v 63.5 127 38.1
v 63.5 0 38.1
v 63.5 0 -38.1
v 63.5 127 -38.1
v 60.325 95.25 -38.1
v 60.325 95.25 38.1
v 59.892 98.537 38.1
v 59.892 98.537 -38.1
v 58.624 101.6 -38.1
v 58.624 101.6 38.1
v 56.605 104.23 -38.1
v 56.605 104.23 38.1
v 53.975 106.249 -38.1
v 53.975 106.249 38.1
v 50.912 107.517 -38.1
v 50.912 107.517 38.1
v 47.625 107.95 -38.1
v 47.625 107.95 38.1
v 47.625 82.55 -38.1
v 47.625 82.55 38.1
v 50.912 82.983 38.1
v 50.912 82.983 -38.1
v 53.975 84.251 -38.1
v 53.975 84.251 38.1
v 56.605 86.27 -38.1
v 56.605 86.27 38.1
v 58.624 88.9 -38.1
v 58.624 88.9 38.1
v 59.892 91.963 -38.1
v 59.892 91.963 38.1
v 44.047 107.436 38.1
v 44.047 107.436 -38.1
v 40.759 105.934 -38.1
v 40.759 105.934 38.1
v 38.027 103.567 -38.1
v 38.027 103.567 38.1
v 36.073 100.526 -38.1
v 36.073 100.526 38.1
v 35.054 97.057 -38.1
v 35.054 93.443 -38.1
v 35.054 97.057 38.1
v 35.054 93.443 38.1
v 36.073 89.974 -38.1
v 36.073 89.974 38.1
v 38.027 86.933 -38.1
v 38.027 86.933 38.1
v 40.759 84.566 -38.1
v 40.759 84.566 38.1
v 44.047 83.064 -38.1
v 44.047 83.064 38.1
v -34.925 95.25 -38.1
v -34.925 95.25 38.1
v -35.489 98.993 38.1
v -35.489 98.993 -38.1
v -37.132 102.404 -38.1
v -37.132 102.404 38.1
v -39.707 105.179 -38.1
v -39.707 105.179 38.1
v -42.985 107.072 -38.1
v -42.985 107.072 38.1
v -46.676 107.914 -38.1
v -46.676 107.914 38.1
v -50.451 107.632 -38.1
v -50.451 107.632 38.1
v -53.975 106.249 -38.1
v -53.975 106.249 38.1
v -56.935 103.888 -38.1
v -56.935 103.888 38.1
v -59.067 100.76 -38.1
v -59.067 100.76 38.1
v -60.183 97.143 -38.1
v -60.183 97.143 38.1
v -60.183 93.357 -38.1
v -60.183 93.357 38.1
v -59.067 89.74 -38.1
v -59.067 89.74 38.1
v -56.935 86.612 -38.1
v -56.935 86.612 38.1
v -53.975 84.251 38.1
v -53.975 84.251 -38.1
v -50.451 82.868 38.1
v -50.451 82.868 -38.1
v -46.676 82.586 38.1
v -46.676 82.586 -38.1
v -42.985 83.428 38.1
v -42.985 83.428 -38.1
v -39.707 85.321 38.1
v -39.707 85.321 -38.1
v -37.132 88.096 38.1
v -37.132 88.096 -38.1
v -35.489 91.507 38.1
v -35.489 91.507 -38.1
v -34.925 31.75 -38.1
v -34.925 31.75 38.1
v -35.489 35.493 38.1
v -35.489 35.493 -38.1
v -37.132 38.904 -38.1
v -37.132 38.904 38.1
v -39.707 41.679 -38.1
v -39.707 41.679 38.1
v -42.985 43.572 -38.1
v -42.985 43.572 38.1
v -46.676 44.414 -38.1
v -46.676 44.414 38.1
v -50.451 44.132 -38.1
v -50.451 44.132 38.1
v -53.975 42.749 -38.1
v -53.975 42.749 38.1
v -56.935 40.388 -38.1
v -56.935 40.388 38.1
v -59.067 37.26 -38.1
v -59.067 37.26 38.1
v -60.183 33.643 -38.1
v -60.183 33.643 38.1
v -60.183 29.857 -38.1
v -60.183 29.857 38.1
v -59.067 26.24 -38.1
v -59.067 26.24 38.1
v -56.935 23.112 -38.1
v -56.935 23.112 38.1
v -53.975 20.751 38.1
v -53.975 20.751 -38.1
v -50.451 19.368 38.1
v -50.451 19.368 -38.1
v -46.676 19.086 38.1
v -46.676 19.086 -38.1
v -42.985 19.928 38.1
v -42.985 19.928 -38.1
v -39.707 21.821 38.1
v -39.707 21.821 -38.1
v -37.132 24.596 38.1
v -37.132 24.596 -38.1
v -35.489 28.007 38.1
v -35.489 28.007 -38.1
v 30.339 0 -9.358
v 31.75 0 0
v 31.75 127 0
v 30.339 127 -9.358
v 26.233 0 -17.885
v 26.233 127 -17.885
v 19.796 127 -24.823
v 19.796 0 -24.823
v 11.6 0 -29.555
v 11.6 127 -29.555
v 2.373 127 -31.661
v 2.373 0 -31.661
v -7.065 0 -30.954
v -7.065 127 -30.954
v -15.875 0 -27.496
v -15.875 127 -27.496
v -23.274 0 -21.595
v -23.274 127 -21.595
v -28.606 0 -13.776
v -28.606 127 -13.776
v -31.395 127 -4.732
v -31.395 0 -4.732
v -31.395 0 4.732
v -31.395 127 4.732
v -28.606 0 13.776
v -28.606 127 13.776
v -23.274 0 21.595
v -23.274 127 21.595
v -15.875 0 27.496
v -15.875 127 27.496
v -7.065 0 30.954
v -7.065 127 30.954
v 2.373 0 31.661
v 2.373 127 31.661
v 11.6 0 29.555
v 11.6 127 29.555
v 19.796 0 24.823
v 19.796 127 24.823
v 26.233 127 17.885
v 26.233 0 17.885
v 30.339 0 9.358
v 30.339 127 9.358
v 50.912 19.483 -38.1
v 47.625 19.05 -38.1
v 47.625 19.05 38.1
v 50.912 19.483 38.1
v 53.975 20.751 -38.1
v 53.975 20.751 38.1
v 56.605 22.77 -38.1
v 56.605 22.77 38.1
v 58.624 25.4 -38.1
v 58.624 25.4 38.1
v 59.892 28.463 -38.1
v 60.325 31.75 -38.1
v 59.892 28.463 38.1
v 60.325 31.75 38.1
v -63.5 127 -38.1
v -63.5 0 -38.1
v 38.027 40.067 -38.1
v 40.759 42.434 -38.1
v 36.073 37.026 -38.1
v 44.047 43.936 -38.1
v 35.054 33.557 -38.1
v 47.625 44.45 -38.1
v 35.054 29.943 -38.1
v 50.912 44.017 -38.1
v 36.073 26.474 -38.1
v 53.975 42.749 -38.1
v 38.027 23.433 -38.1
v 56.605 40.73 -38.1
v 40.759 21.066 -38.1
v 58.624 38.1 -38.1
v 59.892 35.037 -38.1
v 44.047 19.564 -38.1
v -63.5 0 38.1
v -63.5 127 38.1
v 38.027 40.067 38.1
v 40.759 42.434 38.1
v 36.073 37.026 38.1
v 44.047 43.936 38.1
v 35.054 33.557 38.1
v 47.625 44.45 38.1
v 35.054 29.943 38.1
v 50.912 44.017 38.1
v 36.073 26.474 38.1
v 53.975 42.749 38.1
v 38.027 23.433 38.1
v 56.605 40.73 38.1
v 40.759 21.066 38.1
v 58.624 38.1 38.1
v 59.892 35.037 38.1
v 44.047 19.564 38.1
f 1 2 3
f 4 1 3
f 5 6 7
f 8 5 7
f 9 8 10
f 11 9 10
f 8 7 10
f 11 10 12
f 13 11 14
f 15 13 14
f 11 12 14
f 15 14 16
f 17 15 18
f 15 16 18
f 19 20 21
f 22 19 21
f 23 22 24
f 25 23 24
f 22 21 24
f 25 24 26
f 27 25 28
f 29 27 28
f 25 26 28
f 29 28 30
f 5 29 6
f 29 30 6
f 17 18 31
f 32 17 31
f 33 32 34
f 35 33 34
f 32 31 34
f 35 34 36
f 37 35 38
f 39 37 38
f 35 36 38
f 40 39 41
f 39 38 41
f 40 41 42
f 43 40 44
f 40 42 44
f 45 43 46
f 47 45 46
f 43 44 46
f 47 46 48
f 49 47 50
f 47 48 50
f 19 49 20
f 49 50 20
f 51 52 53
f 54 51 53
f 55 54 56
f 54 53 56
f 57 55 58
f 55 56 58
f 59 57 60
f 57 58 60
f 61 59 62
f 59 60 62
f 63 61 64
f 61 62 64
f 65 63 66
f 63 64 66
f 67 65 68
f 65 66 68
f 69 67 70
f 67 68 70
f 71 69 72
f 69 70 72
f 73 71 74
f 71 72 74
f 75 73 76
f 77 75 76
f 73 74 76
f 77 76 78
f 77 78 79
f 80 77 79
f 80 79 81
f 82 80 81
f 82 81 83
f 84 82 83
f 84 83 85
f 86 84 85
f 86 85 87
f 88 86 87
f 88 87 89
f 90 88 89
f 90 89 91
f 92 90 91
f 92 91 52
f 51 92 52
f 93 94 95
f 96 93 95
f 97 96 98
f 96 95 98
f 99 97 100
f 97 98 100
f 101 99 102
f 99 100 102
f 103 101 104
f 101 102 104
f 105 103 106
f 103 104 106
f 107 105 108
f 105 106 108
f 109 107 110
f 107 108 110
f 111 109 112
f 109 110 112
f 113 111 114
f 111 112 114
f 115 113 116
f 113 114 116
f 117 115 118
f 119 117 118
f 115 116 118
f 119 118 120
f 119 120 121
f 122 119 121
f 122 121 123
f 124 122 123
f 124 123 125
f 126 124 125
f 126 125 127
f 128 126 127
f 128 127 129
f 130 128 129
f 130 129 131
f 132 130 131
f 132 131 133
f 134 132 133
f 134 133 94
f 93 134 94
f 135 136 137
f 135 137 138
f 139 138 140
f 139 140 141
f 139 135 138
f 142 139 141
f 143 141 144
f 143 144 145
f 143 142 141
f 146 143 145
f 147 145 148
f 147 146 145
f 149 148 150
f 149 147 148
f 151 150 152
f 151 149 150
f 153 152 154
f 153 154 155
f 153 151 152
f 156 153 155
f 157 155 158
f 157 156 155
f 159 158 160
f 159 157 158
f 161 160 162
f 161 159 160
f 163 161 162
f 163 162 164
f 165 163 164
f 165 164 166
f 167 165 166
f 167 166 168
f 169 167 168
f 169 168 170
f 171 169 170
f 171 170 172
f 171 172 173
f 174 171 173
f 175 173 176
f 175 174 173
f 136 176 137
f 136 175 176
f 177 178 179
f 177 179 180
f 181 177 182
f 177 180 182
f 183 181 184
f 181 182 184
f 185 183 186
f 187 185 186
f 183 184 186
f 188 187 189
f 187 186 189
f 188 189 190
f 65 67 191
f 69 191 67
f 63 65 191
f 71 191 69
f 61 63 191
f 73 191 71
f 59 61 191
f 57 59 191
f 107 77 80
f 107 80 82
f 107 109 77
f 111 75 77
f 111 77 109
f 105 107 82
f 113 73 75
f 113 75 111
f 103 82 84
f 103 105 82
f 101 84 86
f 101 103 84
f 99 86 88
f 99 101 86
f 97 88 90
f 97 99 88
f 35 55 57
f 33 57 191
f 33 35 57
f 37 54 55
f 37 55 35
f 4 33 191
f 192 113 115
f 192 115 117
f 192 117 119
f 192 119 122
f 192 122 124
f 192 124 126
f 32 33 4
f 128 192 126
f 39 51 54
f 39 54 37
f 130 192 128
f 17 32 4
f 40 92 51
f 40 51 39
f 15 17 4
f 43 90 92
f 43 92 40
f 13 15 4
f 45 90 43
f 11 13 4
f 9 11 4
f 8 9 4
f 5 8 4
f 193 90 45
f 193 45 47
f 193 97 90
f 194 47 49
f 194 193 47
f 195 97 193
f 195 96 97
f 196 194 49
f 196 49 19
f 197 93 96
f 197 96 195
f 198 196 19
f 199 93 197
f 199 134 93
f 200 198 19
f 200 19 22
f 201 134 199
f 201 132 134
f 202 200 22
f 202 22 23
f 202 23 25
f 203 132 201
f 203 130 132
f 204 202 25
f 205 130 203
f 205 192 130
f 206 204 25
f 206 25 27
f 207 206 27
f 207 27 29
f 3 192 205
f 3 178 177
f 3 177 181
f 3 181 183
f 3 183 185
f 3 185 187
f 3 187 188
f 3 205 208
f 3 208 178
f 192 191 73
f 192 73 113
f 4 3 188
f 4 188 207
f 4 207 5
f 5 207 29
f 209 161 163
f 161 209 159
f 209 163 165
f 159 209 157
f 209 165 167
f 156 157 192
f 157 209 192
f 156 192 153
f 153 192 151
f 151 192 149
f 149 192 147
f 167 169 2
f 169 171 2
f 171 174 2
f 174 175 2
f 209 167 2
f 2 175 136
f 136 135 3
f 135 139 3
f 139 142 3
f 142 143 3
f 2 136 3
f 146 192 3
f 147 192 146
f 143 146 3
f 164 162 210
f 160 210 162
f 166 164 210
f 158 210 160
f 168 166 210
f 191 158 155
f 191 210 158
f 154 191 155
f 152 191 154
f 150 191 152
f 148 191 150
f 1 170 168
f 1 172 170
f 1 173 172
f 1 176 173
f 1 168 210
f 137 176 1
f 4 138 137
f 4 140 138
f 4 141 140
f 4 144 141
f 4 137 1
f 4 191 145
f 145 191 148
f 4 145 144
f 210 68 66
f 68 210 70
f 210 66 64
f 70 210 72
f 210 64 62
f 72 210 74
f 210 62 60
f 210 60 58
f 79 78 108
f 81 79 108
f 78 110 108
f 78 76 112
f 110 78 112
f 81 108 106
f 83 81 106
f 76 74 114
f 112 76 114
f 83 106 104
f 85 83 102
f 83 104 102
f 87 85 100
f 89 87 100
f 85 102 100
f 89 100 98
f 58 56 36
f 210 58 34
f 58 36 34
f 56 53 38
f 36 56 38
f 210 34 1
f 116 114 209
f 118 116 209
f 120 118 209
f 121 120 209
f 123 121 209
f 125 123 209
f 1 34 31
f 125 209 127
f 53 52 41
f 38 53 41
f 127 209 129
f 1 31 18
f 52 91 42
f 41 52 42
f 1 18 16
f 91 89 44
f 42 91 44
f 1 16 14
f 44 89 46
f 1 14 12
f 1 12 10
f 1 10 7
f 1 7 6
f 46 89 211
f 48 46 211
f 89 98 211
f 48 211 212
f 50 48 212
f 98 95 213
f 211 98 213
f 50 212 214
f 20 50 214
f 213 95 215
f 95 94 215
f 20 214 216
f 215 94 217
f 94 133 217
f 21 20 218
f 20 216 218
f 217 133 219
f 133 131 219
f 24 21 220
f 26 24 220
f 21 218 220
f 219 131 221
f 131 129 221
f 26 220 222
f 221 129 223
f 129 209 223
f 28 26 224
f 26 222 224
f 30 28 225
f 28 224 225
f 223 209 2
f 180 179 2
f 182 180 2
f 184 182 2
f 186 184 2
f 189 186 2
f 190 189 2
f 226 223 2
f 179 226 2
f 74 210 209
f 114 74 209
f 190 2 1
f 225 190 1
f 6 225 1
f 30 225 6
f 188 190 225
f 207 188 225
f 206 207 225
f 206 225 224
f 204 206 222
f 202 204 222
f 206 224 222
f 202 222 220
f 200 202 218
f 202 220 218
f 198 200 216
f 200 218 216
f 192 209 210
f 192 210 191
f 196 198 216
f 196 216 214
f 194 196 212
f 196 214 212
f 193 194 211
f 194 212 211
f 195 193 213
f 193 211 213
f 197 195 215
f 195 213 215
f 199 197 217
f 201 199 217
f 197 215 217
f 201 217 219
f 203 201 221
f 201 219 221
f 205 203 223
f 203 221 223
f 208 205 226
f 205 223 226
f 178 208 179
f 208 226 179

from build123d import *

# Parameters (mm, degrees)
SKETCH2_W           = 127
SKETCH2_H           = 76.2
SKETCH2_R           = 31.75
BOSS_EXTRUDE1_DEPTH = 127
SKETCH3_R           = 12.7
CUT_EXTRUDE1_DEPTH  = 127


with BuildPart() as part:
    # Sketch2 → Boss-Extrude1 (new body)
    with BuildSketch(Plane(origin=(0, 0, 0), x_dir=(1, 0, 0), z_dir=(0, 1, 0))):
        Rectangle(SKETCH2_W, SKETCH2_H)
        Circle(SKETCH2_R, mode=Mode.SUBTRACT)
    extrude(amount=BOSS_EXTRUDE1_DEPTH)

    # Sketch3 → Cut-Extrude1 (cut)
    with BuildSketch(Plane.XY.offset(38.1)):
        with BuildLine():
            ThreePointArc((60.325, 95.25), (56.605256121, 104.230256121), (47.625, 107.95))
            Line((47.625, 107.95), (47.625, 82.55))
            ThreePointArc((47.625, 82.55), (56.605256121, 86.269743879), (60.325, 95.25))
        make_face()
        with BuildLine():
            Line((47.625, 82.55), (47.625, 107.95))
            ThreePointArc((47.625, 107.95), (34.925, 95.25), (47.625, 82.55))
        make_face()
        with BuildLine():
            ThreePointArc((60.325, 31.75), (56.605256121, 40.730256121), (47.625, 44.45))
            Line((47.625, 44.45), (47.625, 19.05))
            ThreePointArc((47.625, 19.05), (56.605256121, 22.769743879), (60.325, 31.75))
        make_face()
        with BuildLine():
            Line((47.625, 19.05), (47.625, 44.45))
            ThreePointArc((47.625, 44.45), (34.925, 31.75), (47.625, 19.05))
        make_face()
        with Locations((-47.625, 31.75)):
            Circle(SKETCH3_R)
        with Locations((-47.625, 95.25)):
            Circle(SKETCH3_R)
    extrude(amount=-CUT_EXTRUDE1_DEPTH, mode=Mode.SUBTRACT)


solid = part.part
